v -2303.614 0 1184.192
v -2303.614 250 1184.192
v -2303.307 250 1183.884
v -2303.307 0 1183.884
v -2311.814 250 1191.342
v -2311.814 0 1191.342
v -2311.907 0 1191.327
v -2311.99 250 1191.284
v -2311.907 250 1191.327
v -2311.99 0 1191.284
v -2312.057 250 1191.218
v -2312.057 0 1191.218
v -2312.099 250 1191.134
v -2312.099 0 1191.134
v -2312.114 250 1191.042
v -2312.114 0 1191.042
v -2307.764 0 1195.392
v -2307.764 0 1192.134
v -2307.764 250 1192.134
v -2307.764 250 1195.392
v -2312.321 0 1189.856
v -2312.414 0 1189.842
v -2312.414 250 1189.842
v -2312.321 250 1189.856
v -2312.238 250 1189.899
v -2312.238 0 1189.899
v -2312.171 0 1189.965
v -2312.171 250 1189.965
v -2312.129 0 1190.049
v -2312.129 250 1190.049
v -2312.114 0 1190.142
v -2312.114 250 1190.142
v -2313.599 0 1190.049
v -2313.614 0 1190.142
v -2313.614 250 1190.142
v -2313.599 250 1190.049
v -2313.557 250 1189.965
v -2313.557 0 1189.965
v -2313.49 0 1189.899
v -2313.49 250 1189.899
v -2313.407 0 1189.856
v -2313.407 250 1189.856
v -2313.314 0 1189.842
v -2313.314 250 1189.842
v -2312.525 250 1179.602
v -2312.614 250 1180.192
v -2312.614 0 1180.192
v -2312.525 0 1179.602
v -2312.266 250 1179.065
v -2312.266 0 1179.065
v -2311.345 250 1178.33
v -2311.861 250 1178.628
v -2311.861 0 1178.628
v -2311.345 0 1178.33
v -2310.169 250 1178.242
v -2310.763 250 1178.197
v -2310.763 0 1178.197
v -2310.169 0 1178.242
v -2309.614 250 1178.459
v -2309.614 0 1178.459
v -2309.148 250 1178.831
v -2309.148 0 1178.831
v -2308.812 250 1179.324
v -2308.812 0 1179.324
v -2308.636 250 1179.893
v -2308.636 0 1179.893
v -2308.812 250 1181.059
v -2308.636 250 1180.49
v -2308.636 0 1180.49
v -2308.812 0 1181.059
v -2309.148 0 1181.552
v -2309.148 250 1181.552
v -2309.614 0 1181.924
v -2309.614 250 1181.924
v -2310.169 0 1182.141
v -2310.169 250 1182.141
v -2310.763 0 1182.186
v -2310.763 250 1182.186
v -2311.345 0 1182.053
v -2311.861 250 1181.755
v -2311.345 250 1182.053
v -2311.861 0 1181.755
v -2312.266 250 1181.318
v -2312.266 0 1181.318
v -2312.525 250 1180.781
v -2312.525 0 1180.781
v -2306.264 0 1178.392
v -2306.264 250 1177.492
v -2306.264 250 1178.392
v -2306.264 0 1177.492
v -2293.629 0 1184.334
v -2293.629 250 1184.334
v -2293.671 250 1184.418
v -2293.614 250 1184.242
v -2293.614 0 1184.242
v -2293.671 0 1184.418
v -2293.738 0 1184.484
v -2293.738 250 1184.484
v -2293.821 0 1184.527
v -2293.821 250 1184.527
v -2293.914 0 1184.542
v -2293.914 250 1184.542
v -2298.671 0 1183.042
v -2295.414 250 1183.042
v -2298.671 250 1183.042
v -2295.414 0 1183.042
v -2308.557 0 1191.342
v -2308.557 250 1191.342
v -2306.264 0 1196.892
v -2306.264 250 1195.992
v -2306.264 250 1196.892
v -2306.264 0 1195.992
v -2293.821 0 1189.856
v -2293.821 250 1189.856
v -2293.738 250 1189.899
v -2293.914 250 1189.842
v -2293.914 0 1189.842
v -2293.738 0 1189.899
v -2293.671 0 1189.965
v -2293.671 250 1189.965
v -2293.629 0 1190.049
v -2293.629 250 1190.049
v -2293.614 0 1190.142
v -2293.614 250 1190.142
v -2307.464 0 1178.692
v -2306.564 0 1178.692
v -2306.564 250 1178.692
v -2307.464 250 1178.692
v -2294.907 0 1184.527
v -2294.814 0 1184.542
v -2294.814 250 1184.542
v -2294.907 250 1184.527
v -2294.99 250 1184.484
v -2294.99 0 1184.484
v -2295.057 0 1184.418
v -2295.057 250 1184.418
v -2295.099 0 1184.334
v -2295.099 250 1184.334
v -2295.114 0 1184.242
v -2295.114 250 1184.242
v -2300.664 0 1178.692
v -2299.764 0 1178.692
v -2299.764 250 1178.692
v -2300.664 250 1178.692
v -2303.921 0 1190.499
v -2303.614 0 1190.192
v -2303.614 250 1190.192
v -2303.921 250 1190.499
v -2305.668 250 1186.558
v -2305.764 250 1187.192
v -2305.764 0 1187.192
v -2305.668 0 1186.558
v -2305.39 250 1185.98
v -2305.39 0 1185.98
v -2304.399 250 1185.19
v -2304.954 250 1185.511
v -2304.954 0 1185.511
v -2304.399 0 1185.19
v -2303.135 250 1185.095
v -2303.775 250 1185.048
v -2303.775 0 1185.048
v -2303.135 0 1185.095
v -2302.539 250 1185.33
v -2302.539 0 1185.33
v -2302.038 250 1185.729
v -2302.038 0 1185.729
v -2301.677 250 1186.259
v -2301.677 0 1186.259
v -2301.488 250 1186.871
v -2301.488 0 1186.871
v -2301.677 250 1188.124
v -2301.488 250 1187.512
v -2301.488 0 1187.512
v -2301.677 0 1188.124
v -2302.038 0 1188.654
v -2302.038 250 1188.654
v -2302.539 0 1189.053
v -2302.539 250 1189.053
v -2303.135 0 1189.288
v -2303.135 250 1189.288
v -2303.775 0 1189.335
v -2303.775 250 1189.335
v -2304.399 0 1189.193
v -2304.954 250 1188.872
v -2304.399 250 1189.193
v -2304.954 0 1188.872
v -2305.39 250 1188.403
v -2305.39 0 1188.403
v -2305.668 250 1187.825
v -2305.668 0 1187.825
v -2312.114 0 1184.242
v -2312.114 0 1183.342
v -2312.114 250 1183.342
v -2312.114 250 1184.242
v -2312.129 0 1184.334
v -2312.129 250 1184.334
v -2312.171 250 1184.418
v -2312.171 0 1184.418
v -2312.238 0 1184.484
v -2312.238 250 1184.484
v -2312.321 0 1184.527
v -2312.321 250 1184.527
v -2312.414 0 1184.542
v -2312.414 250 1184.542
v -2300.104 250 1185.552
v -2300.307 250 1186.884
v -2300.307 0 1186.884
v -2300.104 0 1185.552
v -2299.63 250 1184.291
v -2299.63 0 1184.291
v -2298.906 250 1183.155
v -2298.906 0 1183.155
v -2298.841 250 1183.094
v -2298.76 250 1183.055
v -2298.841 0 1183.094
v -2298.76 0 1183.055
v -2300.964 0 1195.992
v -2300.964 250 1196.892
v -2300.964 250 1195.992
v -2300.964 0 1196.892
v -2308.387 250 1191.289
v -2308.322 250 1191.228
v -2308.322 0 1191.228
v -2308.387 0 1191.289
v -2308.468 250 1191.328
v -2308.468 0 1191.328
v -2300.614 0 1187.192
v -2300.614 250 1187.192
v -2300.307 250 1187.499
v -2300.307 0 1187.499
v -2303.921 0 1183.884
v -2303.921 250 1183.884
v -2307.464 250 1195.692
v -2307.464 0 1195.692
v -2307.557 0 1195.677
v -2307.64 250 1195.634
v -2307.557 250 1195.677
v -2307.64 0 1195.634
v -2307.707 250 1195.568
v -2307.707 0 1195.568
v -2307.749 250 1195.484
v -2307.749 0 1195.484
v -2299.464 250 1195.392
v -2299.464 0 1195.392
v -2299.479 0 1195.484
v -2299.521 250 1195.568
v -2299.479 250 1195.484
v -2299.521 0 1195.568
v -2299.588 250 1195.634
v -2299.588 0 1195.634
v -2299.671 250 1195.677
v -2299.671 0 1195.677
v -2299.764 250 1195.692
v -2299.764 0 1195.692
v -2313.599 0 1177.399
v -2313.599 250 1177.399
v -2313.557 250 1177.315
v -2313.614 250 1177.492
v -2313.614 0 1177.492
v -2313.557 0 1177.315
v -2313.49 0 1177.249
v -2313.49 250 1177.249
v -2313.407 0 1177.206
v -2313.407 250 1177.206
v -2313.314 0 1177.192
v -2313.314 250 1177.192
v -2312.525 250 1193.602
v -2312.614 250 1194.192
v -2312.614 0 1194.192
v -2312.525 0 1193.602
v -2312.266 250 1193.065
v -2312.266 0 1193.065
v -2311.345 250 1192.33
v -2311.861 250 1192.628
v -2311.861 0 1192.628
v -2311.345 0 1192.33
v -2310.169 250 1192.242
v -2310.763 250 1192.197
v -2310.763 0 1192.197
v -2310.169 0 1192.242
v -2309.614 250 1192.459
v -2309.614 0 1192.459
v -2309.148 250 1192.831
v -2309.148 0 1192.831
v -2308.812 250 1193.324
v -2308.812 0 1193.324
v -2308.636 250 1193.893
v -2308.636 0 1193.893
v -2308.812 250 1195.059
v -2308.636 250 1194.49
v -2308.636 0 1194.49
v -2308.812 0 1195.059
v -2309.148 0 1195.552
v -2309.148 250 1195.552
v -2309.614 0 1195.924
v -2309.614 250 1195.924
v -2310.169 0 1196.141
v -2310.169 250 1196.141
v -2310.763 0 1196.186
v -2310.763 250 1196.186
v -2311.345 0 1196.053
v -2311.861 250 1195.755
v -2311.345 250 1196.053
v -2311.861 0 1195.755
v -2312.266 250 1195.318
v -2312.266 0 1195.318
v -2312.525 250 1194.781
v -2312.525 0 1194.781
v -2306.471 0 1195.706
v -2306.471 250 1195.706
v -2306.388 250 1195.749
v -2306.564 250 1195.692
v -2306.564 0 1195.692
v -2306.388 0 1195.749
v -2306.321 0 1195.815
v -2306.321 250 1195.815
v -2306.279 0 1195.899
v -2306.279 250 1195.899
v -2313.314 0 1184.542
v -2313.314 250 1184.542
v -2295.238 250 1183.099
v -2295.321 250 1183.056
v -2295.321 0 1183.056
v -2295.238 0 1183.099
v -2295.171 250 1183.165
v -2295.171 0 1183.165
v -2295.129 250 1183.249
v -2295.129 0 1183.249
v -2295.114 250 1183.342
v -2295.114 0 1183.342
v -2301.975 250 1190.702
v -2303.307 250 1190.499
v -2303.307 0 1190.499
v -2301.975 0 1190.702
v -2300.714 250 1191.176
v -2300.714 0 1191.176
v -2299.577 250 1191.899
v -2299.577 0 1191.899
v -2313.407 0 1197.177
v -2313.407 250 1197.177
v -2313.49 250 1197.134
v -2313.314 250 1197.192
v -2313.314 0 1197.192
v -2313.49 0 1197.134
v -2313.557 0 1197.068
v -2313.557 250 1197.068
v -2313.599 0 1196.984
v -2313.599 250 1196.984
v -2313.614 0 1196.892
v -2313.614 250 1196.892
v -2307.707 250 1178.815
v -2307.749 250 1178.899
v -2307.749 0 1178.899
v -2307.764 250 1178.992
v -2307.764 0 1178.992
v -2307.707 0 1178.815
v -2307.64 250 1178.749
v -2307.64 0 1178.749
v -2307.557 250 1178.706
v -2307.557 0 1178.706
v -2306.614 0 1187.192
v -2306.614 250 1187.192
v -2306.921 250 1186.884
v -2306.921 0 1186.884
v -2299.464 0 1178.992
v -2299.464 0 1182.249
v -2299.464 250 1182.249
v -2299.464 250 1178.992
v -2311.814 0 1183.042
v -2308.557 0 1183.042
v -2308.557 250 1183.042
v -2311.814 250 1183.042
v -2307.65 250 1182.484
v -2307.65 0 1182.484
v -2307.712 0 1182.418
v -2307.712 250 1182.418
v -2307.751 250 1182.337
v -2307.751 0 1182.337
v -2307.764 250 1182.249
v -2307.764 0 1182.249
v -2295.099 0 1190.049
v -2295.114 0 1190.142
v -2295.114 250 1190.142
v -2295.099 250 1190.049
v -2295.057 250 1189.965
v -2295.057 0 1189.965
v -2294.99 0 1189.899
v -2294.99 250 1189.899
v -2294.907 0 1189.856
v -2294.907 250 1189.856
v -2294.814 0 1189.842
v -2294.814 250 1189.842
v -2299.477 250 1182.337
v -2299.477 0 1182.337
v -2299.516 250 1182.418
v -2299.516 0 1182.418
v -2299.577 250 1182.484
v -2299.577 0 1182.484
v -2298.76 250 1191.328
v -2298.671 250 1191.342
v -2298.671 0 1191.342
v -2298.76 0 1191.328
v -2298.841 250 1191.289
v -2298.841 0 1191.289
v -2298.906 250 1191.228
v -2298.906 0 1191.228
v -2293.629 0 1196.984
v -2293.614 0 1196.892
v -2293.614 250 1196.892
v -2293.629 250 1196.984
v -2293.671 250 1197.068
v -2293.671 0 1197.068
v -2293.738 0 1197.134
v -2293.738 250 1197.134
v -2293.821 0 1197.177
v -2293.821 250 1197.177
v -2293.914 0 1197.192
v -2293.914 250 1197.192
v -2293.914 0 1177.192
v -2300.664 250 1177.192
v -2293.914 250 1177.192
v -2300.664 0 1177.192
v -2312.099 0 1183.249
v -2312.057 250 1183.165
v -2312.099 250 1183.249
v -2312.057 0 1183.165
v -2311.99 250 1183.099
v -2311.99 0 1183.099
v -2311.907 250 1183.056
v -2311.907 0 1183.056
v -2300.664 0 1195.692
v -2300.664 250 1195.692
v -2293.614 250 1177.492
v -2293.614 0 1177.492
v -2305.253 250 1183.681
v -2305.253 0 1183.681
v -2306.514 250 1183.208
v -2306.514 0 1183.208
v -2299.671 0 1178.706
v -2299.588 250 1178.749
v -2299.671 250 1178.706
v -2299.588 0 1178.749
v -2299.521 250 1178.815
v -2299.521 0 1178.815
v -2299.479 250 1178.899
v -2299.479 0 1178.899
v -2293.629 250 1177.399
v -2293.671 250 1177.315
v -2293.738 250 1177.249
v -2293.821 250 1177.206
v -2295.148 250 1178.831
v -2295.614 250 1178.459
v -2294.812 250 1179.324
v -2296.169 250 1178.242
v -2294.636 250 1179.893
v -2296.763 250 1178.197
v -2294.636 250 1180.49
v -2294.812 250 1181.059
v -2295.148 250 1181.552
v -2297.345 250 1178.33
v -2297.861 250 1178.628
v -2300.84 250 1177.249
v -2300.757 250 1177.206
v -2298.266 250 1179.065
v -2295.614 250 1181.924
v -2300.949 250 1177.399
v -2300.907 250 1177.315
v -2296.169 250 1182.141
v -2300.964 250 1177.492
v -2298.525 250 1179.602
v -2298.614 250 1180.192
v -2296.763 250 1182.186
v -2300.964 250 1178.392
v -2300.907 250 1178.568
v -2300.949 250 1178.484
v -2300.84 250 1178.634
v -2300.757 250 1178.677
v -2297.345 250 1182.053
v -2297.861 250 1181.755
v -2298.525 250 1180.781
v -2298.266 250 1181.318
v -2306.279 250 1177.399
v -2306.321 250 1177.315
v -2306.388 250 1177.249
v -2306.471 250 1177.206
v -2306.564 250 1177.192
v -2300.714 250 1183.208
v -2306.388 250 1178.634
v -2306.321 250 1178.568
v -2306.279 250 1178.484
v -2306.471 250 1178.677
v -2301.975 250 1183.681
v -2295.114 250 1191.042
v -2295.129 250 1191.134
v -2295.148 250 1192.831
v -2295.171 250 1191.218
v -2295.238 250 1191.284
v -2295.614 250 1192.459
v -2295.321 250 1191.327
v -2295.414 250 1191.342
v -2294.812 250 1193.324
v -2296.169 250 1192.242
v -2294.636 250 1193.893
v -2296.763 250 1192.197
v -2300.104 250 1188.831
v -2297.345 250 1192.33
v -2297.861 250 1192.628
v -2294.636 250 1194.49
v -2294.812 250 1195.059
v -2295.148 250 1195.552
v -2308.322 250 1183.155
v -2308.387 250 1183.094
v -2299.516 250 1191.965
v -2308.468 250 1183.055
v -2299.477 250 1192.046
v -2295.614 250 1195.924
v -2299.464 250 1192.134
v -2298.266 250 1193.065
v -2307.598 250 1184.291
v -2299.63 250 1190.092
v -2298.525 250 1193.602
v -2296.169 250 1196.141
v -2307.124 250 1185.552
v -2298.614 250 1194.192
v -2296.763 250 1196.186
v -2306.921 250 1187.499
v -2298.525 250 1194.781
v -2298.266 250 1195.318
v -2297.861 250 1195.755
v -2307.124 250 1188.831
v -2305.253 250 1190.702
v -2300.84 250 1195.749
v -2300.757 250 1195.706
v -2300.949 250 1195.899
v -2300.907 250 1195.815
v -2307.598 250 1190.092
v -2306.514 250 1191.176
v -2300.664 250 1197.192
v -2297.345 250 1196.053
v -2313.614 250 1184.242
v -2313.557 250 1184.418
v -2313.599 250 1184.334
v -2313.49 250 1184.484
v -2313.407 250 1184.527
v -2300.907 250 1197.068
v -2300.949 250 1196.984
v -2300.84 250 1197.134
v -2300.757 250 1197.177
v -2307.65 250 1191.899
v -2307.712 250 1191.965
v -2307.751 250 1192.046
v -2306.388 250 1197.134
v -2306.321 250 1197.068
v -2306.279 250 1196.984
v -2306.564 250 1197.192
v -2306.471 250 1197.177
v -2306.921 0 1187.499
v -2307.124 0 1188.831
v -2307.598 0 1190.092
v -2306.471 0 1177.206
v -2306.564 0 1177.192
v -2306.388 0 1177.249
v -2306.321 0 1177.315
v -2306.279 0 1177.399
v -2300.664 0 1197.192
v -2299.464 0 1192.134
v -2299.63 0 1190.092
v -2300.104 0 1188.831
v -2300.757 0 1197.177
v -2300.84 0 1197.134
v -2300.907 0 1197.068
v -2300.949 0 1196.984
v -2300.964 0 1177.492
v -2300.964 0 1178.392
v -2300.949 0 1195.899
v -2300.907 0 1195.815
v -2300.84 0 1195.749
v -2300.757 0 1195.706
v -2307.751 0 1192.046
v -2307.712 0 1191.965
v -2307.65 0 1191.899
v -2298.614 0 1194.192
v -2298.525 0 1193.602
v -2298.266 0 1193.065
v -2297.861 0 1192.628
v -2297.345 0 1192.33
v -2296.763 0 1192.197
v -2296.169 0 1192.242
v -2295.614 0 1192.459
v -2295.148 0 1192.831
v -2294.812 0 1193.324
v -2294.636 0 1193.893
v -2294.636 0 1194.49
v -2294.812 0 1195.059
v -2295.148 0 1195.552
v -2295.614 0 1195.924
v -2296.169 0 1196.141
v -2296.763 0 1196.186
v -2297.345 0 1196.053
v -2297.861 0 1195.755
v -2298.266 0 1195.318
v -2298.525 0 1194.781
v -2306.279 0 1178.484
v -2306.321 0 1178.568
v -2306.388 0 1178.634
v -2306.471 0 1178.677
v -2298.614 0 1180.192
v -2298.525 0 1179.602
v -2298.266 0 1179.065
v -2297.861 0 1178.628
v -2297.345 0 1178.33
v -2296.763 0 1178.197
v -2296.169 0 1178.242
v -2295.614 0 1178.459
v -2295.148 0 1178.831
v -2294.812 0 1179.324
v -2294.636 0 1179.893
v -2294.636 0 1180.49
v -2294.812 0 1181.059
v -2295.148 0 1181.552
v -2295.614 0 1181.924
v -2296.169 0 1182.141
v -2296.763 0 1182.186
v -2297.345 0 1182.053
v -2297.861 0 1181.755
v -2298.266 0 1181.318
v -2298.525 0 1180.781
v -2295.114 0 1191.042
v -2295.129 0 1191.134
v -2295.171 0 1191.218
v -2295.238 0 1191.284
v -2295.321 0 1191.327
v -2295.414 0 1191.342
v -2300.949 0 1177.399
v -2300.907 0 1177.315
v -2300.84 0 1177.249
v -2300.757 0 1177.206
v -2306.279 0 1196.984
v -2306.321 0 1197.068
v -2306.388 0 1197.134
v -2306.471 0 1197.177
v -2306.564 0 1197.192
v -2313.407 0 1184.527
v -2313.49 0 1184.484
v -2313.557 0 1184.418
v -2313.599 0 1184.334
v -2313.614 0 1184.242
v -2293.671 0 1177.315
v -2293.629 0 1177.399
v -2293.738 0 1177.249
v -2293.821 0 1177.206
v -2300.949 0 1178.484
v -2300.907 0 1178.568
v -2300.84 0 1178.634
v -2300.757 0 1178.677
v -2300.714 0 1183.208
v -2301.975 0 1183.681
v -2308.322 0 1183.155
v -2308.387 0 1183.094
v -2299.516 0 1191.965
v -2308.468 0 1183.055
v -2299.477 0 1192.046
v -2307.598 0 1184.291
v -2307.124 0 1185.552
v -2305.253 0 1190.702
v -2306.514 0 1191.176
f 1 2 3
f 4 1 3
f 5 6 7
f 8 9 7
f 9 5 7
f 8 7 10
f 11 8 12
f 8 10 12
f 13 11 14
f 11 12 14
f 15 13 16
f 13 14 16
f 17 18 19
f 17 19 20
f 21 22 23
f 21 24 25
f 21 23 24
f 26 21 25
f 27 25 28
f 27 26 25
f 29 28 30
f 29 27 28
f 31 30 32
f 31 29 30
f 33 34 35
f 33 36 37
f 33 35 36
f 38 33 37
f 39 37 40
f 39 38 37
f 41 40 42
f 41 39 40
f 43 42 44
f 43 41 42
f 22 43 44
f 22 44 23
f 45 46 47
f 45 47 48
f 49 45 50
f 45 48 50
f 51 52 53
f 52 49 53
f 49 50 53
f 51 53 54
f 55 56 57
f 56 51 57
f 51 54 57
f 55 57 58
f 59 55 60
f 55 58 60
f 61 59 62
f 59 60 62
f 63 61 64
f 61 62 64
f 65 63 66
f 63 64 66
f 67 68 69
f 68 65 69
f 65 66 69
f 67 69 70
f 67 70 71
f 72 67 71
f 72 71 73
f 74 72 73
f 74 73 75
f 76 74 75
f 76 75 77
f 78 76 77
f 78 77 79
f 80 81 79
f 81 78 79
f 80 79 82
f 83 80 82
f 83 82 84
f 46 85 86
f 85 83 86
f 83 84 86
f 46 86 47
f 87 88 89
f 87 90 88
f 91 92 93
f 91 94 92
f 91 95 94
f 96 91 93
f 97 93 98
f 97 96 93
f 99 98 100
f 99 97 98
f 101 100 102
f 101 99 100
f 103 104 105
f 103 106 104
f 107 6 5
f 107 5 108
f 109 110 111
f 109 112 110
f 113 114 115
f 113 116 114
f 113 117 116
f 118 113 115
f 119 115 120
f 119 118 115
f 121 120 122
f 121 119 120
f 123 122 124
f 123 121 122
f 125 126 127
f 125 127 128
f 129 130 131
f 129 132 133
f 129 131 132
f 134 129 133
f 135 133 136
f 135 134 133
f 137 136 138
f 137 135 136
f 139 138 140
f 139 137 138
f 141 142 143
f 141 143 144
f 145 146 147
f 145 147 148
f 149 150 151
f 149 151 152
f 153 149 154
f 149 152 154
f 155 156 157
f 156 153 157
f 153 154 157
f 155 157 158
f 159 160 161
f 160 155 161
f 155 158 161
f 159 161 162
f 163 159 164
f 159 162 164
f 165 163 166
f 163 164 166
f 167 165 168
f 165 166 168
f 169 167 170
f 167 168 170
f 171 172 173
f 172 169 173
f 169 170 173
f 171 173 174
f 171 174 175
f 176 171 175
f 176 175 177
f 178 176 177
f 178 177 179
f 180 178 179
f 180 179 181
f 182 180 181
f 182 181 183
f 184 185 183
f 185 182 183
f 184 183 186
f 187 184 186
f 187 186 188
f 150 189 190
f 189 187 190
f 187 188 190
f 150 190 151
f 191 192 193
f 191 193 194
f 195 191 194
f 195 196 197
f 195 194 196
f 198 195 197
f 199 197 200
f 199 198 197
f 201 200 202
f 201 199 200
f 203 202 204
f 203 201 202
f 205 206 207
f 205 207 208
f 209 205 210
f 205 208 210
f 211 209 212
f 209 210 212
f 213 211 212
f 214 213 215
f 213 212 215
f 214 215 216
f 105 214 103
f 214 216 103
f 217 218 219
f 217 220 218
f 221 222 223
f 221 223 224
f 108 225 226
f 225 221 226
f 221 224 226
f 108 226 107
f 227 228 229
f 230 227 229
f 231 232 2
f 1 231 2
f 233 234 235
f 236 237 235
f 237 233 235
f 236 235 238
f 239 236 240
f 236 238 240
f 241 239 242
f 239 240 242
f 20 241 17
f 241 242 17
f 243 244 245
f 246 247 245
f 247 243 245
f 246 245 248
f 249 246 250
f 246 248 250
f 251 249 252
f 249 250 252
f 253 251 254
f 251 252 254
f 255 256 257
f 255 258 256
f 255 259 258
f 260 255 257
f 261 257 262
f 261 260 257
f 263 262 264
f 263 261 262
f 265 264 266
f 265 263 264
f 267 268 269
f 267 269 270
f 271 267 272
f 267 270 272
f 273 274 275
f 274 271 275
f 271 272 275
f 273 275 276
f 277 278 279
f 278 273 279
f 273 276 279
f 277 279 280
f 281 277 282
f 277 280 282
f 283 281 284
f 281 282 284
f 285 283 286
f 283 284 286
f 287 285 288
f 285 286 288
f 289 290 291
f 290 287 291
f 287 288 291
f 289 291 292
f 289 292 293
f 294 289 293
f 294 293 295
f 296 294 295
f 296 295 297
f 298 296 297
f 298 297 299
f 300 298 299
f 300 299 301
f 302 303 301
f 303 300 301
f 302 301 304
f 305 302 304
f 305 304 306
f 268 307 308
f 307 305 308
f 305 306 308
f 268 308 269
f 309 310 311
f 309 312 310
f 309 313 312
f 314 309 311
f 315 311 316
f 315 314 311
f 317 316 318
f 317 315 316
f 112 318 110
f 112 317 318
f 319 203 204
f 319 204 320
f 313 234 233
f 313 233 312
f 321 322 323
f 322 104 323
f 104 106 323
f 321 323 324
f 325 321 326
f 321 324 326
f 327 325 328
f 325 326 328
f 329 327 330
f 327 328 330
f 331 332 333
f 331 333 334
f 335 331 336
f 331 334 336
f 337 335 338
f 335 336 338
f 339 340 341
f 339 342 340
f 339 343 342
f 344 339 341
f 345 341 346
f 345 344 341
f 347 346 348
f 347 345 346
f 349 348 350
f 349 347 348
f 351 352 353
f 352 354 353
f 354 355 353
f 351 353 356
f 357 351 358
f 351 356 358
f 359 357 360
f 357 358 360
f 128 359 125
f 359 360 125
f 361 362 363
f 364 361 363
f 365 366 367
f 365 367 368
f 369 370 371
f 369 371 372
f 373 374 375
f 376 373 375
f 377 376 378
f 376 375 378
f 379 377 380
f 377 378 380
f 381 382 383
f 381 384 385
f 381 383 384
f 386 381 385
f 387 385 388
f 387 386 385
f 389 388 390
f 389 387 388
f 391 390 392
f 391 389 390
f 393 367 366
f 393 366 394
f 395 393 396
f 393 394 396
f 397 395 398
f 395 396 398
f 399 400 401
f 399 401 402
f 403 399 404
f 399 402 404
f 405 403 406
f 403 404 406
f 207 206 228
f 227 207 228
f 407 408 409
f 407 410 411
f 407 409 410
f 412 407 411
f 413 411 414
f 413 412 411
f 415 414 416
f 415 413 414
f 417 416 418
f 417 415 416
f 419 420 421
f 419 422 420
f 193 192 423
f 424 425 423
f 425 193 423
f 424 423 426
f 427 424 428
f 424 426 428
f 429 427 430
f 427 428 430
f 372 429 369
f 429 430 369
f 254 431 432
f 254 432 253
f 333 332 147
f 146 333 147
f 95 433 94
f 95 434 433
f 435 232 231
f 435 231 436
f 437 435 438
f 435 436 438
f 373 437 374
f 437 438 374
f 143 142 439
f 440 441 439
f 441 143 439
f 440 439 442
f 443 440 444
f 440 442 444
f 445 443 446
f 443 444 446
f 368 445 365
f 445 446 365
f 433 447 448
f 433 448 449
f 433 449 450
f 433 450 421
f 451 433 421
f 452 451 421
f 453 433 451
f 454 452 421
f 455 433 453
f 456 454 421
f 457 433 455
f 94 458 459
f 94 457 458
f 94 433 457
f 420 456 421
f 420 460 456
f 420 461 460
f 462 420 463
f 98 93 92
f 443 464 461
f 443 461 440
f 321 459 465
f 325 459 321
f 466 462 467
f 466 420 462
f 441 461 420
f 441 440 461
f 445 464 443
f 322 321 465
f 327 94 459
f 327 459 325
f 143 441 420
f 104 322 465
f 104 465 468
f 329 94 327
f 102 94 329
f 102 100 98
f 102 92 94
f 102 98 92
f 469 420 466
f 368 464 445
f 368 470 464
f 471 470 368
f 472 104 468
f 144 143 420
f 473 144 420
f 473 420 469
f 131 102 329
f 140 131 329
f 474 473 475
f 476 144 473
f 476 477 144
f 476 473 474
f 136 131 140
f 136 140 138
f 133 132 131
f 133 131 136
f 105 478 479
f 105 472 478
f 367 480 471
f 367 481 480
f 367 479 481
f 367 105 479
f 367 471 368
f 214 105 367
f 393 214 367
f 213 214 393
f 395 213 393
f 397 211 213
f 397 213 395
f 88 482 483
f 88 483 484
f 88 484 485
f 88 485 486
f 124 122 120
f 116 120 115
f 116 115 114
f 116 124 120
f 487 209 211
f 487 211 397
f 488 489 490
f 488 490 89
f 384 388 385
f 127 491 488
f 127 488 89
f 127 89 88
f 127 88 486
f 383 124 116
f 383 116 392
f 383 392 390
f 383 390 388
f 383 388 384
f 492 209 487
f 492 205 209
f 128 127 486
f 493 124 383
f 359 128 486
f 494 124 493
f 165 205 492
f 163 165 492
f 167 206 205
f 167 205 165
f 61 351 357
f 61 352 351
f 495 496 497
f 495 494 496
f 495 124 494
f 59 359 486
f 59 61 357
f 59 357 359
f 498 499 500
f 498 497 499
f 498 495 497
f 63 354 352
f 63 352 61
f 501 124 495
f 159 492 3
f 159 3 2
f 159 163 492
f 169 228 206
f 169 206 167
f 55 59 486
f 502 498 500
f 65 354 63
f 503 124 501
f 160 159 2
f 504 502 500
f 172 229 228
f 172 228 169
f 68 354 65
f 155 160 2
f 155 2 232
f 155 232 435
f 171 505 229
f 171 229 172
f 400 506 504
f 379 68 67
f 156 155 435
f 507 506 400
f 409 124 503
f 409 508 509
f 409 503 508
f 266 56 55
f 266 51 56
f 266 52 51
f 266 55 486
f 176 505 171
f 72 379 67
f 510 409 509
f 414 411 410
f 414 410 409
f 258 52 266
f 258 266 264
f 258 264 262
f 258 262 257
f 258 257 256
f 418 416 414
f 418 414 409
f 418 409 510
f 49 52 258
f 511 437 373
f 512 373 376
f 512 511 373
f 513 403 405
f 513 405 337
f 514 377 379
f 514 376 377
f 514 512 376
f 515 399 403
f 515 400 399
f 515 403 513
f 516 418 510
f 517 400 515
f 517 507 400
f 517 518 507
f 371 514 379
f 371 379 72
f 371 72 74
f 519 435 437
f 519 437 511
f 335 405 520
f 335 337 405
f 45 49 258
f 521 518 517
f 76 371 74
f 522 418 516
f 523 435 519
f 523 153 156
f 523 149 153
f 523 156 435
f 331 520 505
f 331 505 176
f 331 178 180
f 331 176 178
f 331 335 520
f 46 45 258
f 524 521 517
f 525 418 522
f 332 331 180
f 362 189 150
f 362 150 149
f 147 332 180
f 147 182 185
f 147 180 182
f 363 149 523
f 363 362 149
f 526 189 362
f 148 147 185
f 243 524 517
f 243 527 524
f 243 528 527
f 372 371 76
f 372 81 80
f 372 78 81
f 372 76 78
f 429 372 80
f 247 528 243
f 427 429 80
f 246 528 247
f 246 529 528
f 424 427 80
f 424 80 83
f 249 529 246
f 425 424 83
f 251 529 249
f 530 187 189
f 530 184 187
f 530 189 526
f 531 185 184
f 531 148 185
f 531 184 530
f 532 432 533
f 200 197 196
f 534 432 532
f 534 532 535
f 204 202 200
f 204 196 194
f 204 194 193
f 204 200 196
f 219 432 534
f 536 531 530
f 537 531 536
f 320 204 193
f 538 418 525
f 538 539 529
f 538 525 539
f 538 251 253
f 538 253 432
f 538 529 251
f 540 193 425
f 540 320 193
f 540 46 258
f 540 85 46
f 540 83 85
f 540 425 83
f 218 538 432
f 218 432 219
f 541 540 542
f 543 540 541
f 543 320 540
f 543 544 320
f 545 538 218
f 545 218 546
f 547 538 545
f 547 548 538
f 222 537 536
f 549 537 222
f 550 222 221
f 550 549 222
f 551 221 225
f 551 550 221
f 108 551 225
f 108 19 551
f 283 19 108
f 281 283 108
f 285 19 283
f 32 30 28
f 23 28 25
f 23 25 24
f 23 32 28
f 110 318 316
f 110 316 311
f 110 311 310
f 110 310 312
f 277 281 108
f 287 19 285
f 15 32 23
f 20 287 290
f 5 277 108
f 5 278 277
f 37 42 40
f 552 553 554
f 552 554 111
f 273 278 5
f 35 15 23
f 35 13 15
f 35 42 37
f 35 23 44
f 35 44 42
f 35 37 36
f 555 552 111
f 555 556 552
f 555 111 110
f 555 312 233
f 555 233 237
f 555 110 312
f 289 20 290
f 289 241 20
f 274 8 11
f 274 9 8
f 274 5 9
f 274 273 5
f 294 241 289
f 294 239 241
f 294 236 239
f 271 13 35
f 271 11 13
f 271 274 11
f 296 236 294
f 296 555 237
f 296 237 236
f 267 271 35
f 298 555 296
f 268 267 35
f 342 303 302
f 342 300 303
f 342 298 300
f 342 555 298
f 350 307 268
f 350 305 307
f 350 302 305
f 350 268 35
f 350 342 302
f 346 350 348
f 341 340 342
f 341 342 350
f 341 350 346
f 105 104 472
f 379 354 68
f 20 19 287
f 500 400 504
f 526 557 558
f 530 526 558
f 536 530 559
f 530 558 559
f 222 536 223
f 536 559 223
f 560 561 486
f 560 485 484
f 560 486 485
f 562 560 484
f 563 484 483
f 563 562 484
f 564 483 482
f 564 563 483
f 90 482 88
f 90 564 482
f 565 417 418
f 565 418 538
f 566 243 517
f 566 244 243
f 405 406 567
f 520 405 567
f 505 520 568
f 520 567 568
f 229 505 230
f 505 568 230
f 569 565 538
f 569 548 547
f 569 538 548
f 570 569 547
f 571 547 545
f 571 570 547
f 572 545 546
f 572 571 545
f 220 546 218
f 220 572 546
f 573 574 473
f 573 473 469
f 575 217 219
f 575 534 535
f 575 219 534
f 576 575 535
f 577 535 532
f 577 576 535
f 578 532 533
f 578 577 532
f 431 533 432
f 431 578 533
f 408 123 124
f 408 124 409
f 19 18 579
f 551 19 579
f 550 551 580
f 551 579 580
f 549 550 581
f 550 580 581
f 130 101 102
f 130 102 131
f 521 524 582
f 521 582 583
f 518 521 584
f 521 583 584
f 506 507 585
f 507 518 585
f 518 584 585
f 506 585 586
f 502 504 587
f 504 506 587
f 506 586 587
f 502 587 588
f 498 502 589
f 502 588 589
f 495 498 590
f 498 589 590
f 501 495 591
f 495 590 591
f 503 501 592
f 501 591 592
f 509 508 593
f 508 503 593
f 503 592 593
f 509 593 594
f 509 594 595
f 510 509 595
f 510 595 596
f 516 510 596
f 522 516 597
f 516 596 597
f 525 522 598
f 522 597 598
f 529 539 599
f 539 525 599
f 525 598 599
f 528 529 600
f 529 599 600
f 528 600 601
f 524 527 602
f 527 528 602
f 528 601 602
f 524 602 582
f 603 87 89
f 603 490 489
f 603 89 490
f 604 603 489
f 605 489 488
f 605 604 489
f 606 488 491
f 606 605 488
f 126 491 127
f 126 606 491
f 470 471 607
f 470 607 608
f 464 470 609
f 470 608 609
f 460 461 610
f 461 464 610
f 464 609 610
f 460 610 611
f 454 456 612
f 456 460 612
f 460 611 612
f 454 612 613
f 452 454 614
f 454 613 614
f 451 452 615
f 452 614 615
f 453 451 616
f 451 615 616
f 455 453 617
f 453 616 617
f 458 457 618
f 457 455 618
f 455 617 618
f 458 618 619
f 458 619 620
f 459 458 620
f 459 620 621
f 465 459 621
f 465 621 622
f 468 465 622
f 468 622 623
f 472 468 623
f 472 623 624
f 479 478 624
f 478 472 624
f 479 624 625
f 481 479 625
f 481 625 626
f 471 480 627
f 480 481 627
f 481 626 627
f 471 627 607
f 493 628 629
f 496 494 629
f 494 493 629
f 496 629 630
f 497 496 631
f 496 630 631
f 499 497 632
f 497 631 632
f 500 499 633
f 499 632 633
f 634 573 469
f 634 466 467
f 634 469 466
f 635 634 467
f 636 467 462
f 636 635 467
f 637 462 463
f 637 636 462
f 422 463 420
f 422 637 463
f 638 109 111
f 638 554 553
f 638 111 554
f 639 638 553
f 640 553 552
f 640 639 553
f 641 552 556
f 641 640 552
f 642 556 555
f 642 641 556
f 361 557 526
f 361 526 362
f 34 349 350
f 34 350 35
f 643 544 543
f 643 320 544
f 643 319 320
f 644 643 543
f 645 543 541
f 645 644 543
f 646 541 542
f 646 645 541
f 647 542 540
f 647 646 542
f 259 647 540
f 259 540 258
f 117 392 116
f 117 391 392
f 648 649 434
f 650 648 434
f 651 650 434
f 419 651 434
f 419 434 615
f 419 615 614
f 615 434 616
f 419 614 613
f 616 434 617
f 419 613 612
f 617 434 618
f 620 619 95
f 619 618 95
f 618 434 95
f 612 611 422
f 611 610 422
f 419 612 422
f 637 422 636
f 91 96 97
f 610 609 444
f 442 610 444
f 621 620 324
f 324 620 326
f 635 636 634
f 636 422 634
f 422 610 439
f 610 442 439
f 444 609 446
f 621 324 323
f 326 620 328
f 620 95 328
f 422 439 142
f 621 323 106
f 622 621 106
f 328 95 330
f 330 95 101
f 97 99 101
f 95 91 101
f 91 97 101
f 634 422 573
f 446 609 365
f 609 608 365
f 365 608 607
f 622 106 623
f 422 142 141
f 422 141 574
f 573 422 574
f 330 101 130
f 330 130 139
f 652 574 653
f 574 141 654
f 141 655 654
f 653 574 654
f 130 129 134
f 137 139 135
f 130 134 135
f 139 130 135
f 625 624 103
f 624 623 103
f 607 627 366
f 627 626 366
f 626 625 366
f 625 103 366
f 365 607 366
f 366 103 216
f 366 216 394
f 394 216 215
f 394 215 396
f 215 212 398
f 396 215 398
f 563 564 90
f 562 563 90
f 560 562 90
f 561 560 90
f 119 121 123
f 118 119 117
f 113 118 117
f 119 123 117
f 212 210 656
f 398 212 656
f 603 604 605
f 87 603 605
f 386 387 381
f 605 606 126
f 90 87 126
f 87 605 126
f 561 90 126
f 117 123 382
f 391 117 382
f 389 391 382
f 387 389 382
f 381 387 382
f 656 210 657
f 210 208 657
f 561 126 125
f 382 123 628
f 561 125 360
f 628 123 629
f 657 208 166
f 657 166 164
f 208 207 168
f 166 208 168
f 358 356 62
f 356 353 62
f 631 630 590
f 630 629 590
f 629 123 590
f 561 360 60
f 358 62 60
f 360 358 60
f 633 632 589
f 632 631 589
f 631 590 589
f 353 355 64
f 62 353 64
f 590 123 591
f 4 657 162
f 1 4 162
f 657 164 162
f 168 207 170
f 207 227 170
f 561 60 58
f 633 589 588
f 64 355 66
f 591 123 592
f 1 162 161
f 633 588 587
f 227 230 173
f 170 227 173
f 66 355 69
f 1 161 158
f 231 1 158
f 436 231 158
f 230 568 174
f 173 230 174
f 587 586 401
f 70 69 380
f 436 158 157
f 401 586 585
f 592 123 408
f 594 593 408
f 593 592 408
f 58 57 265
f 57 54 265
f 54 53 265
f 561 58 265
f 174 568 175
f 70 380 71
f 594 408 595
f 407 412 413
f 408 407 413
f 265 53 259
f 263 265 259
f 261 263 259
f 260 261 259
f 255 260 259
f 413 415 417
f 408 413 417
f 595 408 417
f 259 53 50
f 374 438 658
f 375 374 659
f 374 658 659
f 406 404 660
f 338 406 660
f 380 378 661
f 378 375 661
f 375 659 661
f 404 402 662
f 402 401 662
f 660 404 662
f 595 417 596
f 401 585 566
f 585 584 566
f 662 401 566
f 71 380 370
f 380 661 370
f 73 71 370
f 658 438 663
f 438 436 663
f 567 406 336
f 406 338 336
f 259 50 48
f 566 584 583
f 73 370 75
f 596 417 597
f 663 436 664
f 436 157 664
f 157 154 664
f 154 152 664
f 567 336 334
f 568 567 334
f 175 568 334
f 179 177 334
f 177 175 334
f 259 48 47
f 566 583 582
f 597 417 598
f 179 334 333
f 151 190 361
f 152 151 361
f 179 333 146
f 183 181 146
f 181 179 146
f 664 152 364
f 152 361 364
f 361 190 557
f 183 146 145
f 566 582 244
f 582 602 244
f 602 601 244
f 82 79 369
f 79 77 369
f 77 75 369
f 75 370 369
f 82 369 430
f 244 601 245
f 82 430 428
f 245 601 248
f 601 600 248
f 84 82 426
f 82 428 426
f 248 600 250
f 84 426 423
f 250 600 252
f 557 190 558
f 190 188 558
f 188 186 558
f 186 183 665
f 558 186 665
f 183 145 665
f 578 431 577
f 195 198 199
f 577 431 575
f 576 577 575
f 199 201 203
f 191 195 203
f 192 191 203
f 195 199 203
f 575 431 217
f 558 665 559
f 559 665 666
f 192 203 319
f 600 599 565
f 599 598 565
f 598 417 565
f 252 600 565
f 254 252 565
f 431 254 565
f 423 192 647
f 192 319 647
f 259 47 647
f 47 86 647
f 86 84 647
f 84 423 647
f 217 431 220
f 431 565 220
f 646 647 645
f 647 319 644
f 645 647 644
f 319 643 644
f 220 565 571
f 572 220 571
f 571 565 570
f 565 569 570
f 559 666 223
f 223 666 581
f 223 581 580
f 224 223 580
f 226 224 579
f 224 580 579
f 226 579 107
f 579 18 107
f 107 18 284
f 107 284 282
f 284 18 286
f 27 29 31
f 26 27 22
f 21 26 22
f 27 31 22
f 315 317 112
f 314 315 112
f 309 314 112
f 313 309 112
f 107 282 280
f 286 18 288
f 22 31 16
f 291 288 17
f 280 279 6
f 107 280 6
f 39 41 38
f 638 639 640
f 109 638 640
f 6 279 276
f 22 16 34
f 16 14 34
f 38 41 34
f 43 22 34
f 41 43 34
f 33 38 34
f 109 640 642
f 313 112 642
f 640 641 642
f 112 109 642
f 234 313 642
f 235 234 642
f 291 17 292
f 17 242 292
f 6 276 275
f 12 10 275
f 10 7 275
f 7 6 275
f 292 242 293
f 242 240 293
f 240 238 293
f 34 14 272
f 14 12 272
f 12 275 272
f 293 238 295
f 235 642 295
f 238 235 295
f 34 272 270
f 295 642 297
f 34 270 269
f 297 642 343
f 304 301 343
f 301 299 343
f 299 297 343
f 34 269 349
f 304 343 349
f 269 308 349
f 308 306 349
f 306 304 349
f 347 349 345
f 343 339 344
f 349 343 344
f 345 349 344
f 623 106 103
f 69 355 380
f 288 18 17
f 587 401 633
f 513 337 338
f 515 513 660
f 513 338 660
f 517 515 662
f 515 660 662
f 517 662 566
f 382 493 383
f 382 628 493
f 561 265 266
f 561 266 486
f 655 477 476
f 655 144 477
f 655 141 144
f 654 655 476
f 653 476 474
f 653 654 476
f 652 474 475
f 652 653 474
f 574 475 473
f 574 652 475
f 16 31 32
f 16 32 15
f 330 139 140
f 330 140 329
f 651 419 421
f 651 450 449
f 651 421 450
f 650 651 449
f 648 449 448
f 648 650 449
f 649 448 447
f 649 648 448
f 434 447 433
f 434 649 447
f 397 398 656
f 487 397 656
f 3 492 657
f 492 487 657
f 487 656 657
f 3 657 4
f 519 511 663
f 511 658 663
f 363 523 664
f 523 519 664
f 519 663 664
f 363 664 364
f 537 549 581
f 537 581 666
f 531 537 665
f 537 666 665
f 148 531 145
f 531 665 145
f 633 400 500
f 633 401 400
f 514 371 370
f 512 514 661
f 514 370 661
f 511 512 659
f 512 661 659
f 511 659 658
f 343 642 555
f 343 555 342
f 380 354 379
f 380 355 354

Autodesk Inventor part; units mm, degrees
ref_plane "YZ Plane" through (0, 0, 0) normal (1, 0, 0) x (0, 1, 0)
ref_plane "XZ Plane" through (0, 0, 0) normal (0, 1, 0) x (-1, 0, 0)
ref_plane "XY Plane" through (0, 0, 0) normal (0, 0, 1) x (1, 0, 0)
sketch "2020_Base" plane through (0, 0, 0) normal (0, 1, 0) x (-1, 0, 0)
  line L0 (2307.7639, 1192.1343) -> (2307.7639, 1195.3915) projected
  arc A0 (2307.7639, 1195.3915) -> (2307.4639, 1195.6915) centre (2307.4639, 1195.3915) ccw projected
  line L1 (2307.4639, 1195.6915) -> (2306.5639, 1195.6915) projected
  arc A1 (2306.2639, 1195.9915) -> (2306.5639, 1195.6915) centre (2306.5639, 1195.9915) ccw projected
  line L2 (2306.2639, 1195.9915) -> (2306.2639, 1196.8915) projected
  arc A2 (2306.5639, 1197.1915) -> (2306.2639, 1196.8915) centre (2306.5639, 1196.8915) ccw projected
  line L3 (2306.5639, 1197.1915) -> (2313.3139, 1197.1915) projected
  arc A3 (2313.6139, 1196.8915) -> (2313.3139, 1197.1915) centre (2313.3139, 1196.8915) ccw projected
  line L4 (2313.6139, 1196.8915) -> (2313.6139, 1190.1415) projected
  arc A4 (2313.3139, 1189.8415) -> (2313.6139, 1190.1415) centre (2313.3139, 1190.1415) ccw projected
  line L5 (2313.3139, 1189.8415) -> (2312.4139, 1189.8415) projected
  arc A5 (2312.1139, 1190.1415) -> (2312.4139, 1189.8415) centre (2312.4139, 1190.1415) ccw projected
  line L6 (2312.1139, 1190.1415) -> (2312.1139, 1191.0415) projected
  arc A6 (2312.1139, 1191.0415) -> (2311.8139, 1191.3415) centre (2311.8139, 1191.0415) ccw projected
  line L7 (2311.8139, 1191.3415) -> (2308.5567, 1191.3415) projected
  arc A7 (2308.5567, 1191.3415) -> (2308.3217, 1191.2281) centre (2308.5567, 1191.0415) ccw projected
  arc A8 (2308.3217, 1191.2281) -> (2306.9212, 1187.4988) centre (2313.4048, 1187.1915) ccw projected
  line L8 (2306.9212, 1187.4988) -> (2306.6139, 1187.1915) projected
  line L9 (2306.6139, 1187.1915) -> (2306.9212, 1186.8843) projected
  arc A9 (2306.9212, 1186.8843) -> (2308.3217, 1183.155) centre (2313.4048, 1187.1915) ccw projected
  arc A10 (2308.3217, 1183.155) -> (2308.5567, 1183.0415) centre (2308.5567, 1183.3415) ccw projected
  line L10 (2308.5567, 1183.0415) -> (2311.8139, 1183.0415) projected
  arc A11 (2311.8139, 1183.0415) -> (2312.1139, 1183.3415) centre (2311.8139, 1183.3415) ccw projected
  line L11 (2312.1139, 1183.3415) -> (2312.1139, 1184.2415) projected
  arc A12 (2312.4139, 1184.5415) -> (2312.1139, 1184.2415) centre (2312.4139, 1184.2415) ccw projected
  line L12 (2312.4139, 1184.5415) -> (2313.3139, 1184.5415) projected
  arc A13 (2313.6139, 1184.2415) -> (2313.3139, 1184.5415) centre (2313.3139, 1184.2415) ccw projected
  line L13 (2313.6139, 1184.2415) -> (2313.6139, 1177.4915) projected
  arc A14 (2313.3139, 1177.1915) -> (2313.6139, 1177.4915) centre (2313.3139, 1177.4915) ccw projected
  line L14 (2313.3139, 1177.1915) -> (2306.5639, 1177.1915) projected
  arc A15 (2306.2639, 1177.4915) -> (2306.5639, 1177.1915) centre (2306.5639, 1177.4915) ccw projected
  line L15 (2306.2639, 1177.4915) -> (2306.2639, 1178.3915) projected
  arc A16 (2306.5639, 1178.6915) -> (2306.2639, 1178.3915) centre (2306.5639, 1178.3915) ccw projected
  line L16 (2306.5639, 1178.6915) -> (2307.4639, 1178.6915) projected
  arc A17 (2307.4639, 1178.6915) -> (2307.7639, 1178.9915) centre (2307.4639, 1178.9915) ccw projected
  line L17 (2307.7639, 1178.9915) -> (2307.7639, 1182.2488) projected
  arc A18 (2307.7639, 1182.2488) -> (2307.6505, 1182.4837) centre (2307.4639, 1182.2488) ccw projected
  arc A19 (2307.6505, 1182.4837) -> (2303.9212, 1183.8843) centre (2303.6139, 1177.4007) ccw projected
  line L18 (2303.9212, 1183.8843) -> (2303.6139, 1184.1915) projected
  line L19 (2303.6139, 1184.1915) -> (2303.3066, 1183.8843) projected
  arc A20 (2303.3066, 1183.8843) -> (2299.5774, 1182.4837) centre (2303.6139, 1177.4007) ccw projected
  arc A21 (2299.5774, 1182.4837) -> (2299.4639, 1182.2488) centre (2299.7639, 1182.2488) ccw projected
  line L20 (2299.4639, 1182.2488) -> (2299.4639, 1178.9915) projected
  arc A22 (2299.4639, 1178.9915) -> (2299.7639, 1178.6915) centre (2299.7639, 1178.9915) ccw projected
  line L21 (2299.7639, 1178.6915) -> (2300.6639, 1178.6915) projected
  arc A23 (2300.9639, 1178.3915) -> (2300.6639, 1178.6915) centre (2300.6639, 1178.3915) ccw projected
  line L22 (2300.9639, 1178.3915) -> (2300.9639, 1177.4915) projected
  arc A24 (2300.6639, 1177.1915) -> (2300.9639, 1177.4915) centre (2300.6639, 1177.4915) ccw projected
  line L23 (2300.6639, 1177.1915) -> (2293.9139, 1177.1915) projected
  arc A25 (2293.6139, 1177.4915) -> (2293.9139, 1177.1915) centre (2293.9139, 1177.4915) ccw projected
  line L24 (2293.6139, 1177.4915) -> (2293.6139, 1184.2415) projected
  arc A26 (2293.9139, 1184.5415) -> (2293.6139, 1184.2415) centre (2293.9139, 1184.2415) ccw projected
  line L25 (2293.9139, 1184.5415) -> (2294.8139, 1184.5415) projected
  arc A27 (2295.1139, 1184.2415) -> (2294.8139, 1184.5415) centre (2294.8139, 1184.2415) ccw projected
  line L26 (2295.1139, 1184.2415) -> (2295.1139, 1183.3415) projected
  arc A28 (2295.1139, 1183.3415) -> (2295.4139, 1183.0415) centre (2295.4139, 1183.3415) ccw projected
  line L27 (2295.4139, 1183.0415) -> (2298.6712, 1183.0415) projected
  arc A29 (2298.6712, 1183.0415) -> (2298.9061, 1183.155) centre (2298.6712, 1183.3415) ccw projected
  arc A30 (2298.9061, 1183.155) -> (2300.3066, 1186.8843) centre (2293.8231, 1187.1915) ccw projected
  line L28 (2300.3066, 1186.8843) -> (2300.6139, 1187.1915) projected
  line L29 (2300.6139, 1187.1915) -> (2300.3066, 1187.4988) projected
  arc A31 (2300.3066, 1187.4988) -> (2298.9061, 1191.2281) centre (2293.8231, 1187.1915) ccw projected
  arc A32 (2298.9061, 1191.2281) -> (2298.6712, 1191.3415) centre (2298.6712, 1191.0415) ccw projected
  line L30 (2298.6712, 1191.3415) -> (2295.4139, 1191.3415) projected
  arc A33 (2295.4139, 1191.3415) -> (2295.1139, 1191.0415) centre (2295.4139, 1191.0415) ccw projected
  line L31 (2295.1139, 1191.0415) -> (2295.1139, 1190.1415) projected
  arc A34 (2294.8139, 1189.8415) -> (2295.1139, 1190.1415) centre (2294.8139, 1190.1415) ccw projected
  line L32 (2294.8139, 1189.8415) -> (2293.9139, 1189.8415) projected
  arc A35 (2293.6139, 1190.1415) -> (2293.9139, 1189.8415) centre (2293.9139, 1190.1415) ccw projected
  line L33 (2293.6139, 1190.1415) -> (2293.6139, 1196.8915) projected
  arc A36 (2293.9139, 1197.1915) -> (2293.6139, 1196.8915) centre (2293.9139, 1196.8915) ccw projected
  line L34 (2293.9139, 1197.1915) -> (2300.6639, 1197.1915) projected
  arc A37 (2300.9639, 1196.8915) -> (2300.6639, 1197.1915) centre (2300.6639, 1196.8915) ccw projected
  line L35 (2300.9639, 1196.8915) -> (2300.9639, 1195.9915) projected
  arc A38 (2300.6639, 1195.6915) -> (2300.9639, 1195.9915) centre (2300.6639, 1195.9915) ccw projected
  line L36 (2300.6639, 1195.6915) -> (2299.7639, 1195.6915) projected
  arc A39 (2299.7639, 1195.6915) -> (2299.4639, 1195.3915) centre (2299.7639, 1195.3915) ccw projected
  line L37 (2299.4639, 1195.3915) -> (2299.4639, 1192.1343) projected
  arc A40 (2299.4639, 1192.1343) -> (2299.5774, 1191.8994) centre (2299.7639, 1192.1343) ccw projected
  arc A41 (2299.5774, 1191.8994) -> (2303.3066, 1190.4988) centre (2303.6139, 1196.9824) ccw projected
  line L38 (2303.3066, 1190.4988) -> (2303.6139, 1190.1915) projected
  line L39 (2303.6139, 1190.1915) -> (2303.9212, 1190.4988) projected
  arc A42 (2303.9212, 1190.4988) -> (2307.6505, 1191.8994) centre (2303.6139, 1196.9824) ccw projected
  arc A43 (2307.6505, 1191.8994) -> (2307.7639, 1192.1343) centre (2307.4639, 1192.1343) ccw projected
  circle A44 centre (2310.6139, 1194.1915) radius 2 projected
  circle A45 centre (2303.6139, 1187.1915) radius 2.15 projected
  circle A46 centre (2296.6139, 1194.1915) radius 2 projected
  circle A47 centre (2296.6139, 1180.1915) radius 2 projected
  circle A48 centre (2310.6139, 1180.1915) radius 2 projected
  point P0 (0, 0)
extrude "300mm 2020" add sketch "2020_Base" along normal blind 250
properties part number "100mm 2020" material "알루미늄 6061"
